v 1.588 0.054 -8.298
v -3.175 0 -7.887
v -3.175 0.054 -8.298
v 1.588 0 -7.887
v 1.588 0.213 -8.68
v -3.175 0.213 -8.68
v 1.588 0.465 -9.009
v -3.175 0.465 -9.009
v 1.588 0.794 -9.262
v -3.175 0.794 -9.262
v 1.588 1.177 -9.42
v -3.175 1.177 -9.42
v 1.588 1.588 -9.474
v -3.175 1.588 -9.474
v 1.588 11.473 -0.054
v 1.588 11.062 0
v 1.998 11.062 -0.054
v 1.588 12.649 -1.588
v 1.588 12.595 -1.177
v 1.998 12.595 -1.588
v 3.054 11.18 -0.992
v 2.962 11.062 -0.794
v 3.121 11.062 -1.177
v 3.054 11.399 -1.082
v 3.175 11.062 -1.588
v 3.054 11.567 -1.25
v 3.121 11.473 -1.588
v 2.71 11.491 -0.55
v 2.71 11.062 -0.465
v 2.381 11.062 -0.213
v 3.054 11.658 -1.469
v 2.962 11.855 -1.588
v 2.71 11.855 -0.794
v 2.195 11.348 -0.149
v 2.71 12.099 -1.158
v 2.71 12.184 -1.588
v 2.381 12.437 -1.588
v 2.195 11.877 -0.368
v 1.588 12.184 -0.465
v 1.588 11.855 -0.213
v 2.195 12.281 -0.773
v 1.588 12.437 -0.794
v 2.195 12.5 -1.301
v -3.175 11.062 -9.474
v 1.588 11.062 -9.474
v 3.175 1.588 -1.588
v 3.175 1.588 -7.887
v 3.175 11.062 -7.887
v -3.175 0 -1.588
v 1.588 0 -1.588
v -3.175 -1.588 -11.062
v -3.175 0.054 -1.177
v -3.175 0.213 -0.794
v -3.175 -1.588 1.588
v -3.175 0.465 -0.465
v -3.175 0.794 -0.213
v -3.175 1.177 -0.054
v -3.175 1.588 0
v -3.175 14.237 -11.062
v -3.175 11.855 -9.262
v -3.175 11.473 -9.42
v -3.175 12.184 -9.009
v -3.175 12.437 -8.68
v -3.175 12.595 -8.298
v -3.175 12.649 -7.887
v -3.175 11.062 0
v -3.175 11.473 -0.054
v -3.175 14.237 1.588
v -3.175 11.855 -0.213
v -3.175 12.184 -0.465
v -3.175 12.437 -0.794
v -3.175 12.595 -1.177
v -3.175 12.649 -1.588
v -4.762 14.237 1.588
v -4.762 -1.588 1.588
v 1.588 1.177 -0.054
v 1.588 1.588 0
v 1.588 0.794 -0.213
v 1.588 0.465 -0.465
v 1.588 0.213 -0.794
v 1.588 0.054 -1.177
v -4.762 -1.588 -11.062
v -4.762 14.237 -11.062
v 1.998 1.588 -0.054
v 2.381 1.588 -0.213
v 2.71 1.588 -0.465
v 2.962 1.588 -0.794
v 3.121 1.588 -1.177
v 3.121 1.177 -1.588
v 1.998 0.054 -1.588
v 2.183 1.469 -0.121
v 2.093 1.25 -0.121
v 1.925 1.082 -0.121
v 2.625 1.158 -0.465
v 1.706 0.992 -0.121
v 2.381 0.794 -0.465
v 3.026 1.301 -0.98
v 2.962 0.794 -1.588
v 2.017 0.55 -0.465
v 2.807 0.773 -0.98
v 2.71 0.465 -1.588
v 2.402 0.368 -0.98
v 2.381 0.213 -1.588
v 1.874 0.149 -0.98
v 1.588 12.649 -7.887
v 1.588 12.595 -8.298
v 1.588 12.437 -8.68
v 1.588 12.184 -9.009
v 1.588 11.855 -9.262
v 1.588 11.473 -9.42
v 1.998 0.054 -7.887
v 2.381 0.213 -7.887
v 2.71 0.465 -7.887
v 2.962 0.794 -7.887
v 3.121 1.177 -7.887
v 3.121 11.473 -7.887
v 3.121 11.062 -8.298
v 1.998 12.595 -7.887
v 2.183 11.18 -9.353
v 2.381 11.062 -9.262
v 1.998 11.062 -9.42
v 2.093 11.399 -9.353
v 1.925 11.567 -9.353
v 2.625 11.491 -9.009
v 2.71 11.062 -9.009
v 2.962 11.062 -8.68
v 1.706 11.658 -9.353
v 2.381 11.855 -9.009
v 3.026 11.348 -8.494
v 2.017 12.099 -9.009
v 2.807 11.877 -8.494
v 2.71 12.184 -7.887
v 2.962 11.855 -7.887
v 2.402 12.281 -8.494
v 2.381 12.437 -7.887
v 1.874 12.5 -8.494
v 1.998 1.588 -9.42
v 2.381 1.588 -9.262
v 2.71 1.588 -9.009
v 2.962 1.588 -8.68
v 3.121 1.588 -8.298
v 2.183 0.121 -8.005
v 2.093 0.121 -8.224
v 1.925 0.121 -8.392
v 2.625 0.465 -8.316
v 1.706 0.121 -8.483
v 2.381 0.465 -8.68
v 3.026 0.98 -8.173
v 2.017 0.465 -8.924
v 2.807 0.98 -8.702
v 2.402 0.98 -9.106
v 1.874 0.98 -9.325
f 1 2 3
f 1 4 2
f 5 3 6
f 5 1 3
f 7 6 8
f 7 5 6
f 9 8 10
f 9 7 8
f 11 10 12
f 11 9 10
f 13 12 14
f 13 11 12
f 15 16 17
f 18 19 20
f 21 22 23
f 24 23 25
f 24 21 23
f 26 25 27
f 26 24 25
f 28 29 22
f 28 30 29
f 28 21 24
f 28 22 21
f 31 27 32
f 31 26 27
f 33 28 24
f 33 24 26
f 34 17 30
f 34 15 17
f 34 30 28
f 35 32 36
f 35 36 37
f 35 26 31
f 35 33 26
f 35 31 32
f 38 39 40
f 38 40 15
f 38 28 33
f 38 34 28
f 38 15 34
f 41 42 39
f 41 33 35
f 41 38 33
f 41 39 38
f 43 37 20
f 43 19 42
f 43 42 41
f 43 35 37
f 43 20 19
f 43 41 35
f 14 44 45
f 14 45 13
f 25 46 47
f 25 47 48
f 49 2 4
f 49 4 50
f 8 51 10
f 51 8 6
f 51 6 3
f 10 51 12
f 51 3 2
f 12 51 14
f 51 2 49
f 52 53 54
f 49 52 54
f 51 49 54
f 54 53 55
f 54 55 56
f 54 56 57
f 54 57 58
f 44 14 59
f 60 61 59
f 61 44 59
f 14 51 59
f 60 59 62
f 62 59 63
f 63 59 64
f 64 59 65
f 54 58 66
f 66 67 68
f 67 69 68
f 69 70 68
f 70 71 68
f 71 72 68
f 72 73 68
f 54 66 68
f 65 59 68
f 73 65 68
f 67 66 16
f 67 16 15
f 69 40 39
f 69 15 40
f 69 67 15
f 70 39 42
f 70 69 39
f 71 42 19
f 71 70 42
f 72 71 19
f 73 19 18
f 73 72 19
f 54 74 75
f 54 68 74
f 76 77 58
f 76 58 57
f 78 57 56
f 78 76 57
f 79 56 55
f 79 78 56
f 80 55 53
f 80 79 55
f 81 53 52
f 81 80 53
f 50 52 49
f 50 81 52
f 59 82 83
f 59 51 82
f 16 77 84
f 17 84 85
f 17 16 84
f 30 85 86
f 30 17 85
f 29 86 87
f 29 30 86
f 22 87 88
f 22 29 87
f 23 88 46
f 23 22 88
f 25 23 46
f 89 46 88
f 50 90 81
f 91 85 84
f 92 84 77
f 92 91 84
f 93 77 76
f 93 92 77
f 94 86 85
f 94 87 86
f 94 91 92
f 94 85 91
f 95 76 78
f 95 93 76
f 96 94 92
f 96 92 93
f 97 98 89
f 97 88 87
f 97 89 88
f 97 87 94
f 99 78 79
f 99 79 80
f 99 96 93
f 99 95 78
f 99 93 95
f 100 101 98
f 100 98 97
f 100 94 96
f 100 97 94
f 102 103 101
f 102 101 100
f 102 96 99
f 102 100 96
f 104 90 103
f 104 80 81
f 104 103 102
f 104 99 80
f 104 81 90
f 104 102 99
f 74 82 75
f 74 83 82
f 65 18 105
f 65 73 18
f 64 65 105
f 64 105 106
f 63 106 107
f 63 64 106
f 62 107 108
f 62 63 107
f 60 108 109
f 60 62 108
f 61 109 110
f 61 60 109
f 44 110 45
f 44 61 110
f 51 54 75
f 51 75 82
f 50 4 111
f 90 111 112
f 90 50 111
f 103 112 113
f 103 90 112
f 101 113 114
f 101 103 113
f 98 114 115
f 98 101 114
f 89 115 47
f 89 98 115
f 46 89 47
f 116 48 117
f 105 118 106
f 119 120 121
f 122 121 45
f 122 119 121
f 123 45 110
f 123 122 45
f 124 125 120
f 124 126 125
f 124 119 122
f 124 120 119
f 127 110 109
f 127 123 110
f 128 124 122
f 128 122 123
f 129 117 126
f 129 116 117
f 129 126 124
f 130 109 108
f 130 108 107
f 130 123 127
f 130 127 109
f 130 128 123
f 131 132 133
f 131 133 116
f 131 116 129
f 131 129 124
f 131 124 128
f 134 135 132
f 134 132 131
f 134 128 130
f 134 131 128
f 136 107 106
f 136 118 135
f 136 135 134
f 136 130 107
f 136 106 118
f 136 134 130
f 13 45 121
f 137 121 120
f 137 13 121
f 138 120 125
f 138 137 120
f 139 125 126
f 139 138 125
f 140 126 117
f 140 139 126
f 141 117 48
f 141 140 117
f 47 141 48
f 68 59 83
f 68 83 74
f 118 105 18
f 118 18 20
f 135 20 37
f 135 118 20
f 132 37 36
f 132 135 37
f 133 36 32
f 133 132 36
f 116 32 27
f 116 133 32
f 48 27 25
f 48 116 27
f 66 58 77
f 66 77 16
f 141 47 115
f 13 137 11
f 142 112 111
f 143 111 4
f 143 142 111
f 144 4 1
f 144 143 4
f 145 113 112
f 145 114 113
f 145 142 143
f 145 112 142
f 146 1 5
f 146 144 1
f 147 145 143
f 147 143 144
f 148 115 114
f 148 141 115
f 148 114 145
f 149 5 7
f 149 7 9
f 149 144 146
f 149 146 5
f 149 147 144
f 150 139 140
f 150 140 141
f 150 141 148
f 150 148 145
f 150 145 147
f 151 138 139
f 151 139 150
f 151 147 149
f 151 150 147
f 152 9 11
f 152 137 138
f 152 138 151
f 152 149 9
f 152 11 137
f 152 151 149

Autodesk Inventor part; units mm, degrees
ref_plane "YZ Plane" through (0, 0, 0) normal (1, 0, 0) x (0, 1, 0)
ref_plane "XZ Plane" through (0, 0, 0) normal (0, 1, 0) x (-1, 0, 0)
ref_plane "XY Plane" through (0, 0, 0) normal (0, 0, 1) x (1, 0, 0)
sketch "Sketch1" plane through (0, 0, 0) normal (1, 0, 0) x (0, 1, 0)
  line L0 (0, 0) -> (12.6492, 0)
  line L1 (12.6492, 0) -> (12.6492, -9.4742)
  line L2 (12.6492, -9.4742) -> (0, -9.4742)
  line L3 (0, -9.4742) -> (0, 0)
  dimension "d0" = 12.6492
  dimension "d1" = 9.4742
extrude "Extrusion1" add sketch "Sketch1" along normal mid plane 6.35
sketch "Sketch2" plane through (-3.175, 0, 0) normal (-1, 0, 0) x (0, 0, 1)
  line L0 (0, 0) -> (0, 12.6492) projected
  line L1 (0, 12.6492) -> (-9.4742, 12.6492) projected
  line L2 (-9.4742, 12.6492) -> (-9.4742, 0) projected
  line L3 (-9.4742, 0) -> (0, 0) projected
  line L4 (1.5875, 14.2367) -> (1.5875, -1.5875)
  line L5 (1.5875, -1.5875) -> (-11.0617, -1.5875)
  line L6 (-11.0617, -1.5875) -> (-11.0617, 14.2367)
  line L7 (-11.0617, 14.2367) -> (1.5875, 14.2367)
  dimension "d4" = 1.5875
extrude "Extrusion2" add sketch "Sketch2" along normal blind 1.5875 contours L3 L2 L1 L0 | L4 L5 L6 L7
fillet "Fillet1" radius 1.5875 8 edges at (0, 12.6492, 0) (3.175, 12.6492, -4.7371) (0, 12.6492, -9.4742) (3.175, 6.3246, -9.4742) (0, 0, -9.4742) (3.175, 0, -4.7371) (0, 0, 0) (3.175, 6.3246, 0)
properties part number "Button" material "ABS Plastic"
